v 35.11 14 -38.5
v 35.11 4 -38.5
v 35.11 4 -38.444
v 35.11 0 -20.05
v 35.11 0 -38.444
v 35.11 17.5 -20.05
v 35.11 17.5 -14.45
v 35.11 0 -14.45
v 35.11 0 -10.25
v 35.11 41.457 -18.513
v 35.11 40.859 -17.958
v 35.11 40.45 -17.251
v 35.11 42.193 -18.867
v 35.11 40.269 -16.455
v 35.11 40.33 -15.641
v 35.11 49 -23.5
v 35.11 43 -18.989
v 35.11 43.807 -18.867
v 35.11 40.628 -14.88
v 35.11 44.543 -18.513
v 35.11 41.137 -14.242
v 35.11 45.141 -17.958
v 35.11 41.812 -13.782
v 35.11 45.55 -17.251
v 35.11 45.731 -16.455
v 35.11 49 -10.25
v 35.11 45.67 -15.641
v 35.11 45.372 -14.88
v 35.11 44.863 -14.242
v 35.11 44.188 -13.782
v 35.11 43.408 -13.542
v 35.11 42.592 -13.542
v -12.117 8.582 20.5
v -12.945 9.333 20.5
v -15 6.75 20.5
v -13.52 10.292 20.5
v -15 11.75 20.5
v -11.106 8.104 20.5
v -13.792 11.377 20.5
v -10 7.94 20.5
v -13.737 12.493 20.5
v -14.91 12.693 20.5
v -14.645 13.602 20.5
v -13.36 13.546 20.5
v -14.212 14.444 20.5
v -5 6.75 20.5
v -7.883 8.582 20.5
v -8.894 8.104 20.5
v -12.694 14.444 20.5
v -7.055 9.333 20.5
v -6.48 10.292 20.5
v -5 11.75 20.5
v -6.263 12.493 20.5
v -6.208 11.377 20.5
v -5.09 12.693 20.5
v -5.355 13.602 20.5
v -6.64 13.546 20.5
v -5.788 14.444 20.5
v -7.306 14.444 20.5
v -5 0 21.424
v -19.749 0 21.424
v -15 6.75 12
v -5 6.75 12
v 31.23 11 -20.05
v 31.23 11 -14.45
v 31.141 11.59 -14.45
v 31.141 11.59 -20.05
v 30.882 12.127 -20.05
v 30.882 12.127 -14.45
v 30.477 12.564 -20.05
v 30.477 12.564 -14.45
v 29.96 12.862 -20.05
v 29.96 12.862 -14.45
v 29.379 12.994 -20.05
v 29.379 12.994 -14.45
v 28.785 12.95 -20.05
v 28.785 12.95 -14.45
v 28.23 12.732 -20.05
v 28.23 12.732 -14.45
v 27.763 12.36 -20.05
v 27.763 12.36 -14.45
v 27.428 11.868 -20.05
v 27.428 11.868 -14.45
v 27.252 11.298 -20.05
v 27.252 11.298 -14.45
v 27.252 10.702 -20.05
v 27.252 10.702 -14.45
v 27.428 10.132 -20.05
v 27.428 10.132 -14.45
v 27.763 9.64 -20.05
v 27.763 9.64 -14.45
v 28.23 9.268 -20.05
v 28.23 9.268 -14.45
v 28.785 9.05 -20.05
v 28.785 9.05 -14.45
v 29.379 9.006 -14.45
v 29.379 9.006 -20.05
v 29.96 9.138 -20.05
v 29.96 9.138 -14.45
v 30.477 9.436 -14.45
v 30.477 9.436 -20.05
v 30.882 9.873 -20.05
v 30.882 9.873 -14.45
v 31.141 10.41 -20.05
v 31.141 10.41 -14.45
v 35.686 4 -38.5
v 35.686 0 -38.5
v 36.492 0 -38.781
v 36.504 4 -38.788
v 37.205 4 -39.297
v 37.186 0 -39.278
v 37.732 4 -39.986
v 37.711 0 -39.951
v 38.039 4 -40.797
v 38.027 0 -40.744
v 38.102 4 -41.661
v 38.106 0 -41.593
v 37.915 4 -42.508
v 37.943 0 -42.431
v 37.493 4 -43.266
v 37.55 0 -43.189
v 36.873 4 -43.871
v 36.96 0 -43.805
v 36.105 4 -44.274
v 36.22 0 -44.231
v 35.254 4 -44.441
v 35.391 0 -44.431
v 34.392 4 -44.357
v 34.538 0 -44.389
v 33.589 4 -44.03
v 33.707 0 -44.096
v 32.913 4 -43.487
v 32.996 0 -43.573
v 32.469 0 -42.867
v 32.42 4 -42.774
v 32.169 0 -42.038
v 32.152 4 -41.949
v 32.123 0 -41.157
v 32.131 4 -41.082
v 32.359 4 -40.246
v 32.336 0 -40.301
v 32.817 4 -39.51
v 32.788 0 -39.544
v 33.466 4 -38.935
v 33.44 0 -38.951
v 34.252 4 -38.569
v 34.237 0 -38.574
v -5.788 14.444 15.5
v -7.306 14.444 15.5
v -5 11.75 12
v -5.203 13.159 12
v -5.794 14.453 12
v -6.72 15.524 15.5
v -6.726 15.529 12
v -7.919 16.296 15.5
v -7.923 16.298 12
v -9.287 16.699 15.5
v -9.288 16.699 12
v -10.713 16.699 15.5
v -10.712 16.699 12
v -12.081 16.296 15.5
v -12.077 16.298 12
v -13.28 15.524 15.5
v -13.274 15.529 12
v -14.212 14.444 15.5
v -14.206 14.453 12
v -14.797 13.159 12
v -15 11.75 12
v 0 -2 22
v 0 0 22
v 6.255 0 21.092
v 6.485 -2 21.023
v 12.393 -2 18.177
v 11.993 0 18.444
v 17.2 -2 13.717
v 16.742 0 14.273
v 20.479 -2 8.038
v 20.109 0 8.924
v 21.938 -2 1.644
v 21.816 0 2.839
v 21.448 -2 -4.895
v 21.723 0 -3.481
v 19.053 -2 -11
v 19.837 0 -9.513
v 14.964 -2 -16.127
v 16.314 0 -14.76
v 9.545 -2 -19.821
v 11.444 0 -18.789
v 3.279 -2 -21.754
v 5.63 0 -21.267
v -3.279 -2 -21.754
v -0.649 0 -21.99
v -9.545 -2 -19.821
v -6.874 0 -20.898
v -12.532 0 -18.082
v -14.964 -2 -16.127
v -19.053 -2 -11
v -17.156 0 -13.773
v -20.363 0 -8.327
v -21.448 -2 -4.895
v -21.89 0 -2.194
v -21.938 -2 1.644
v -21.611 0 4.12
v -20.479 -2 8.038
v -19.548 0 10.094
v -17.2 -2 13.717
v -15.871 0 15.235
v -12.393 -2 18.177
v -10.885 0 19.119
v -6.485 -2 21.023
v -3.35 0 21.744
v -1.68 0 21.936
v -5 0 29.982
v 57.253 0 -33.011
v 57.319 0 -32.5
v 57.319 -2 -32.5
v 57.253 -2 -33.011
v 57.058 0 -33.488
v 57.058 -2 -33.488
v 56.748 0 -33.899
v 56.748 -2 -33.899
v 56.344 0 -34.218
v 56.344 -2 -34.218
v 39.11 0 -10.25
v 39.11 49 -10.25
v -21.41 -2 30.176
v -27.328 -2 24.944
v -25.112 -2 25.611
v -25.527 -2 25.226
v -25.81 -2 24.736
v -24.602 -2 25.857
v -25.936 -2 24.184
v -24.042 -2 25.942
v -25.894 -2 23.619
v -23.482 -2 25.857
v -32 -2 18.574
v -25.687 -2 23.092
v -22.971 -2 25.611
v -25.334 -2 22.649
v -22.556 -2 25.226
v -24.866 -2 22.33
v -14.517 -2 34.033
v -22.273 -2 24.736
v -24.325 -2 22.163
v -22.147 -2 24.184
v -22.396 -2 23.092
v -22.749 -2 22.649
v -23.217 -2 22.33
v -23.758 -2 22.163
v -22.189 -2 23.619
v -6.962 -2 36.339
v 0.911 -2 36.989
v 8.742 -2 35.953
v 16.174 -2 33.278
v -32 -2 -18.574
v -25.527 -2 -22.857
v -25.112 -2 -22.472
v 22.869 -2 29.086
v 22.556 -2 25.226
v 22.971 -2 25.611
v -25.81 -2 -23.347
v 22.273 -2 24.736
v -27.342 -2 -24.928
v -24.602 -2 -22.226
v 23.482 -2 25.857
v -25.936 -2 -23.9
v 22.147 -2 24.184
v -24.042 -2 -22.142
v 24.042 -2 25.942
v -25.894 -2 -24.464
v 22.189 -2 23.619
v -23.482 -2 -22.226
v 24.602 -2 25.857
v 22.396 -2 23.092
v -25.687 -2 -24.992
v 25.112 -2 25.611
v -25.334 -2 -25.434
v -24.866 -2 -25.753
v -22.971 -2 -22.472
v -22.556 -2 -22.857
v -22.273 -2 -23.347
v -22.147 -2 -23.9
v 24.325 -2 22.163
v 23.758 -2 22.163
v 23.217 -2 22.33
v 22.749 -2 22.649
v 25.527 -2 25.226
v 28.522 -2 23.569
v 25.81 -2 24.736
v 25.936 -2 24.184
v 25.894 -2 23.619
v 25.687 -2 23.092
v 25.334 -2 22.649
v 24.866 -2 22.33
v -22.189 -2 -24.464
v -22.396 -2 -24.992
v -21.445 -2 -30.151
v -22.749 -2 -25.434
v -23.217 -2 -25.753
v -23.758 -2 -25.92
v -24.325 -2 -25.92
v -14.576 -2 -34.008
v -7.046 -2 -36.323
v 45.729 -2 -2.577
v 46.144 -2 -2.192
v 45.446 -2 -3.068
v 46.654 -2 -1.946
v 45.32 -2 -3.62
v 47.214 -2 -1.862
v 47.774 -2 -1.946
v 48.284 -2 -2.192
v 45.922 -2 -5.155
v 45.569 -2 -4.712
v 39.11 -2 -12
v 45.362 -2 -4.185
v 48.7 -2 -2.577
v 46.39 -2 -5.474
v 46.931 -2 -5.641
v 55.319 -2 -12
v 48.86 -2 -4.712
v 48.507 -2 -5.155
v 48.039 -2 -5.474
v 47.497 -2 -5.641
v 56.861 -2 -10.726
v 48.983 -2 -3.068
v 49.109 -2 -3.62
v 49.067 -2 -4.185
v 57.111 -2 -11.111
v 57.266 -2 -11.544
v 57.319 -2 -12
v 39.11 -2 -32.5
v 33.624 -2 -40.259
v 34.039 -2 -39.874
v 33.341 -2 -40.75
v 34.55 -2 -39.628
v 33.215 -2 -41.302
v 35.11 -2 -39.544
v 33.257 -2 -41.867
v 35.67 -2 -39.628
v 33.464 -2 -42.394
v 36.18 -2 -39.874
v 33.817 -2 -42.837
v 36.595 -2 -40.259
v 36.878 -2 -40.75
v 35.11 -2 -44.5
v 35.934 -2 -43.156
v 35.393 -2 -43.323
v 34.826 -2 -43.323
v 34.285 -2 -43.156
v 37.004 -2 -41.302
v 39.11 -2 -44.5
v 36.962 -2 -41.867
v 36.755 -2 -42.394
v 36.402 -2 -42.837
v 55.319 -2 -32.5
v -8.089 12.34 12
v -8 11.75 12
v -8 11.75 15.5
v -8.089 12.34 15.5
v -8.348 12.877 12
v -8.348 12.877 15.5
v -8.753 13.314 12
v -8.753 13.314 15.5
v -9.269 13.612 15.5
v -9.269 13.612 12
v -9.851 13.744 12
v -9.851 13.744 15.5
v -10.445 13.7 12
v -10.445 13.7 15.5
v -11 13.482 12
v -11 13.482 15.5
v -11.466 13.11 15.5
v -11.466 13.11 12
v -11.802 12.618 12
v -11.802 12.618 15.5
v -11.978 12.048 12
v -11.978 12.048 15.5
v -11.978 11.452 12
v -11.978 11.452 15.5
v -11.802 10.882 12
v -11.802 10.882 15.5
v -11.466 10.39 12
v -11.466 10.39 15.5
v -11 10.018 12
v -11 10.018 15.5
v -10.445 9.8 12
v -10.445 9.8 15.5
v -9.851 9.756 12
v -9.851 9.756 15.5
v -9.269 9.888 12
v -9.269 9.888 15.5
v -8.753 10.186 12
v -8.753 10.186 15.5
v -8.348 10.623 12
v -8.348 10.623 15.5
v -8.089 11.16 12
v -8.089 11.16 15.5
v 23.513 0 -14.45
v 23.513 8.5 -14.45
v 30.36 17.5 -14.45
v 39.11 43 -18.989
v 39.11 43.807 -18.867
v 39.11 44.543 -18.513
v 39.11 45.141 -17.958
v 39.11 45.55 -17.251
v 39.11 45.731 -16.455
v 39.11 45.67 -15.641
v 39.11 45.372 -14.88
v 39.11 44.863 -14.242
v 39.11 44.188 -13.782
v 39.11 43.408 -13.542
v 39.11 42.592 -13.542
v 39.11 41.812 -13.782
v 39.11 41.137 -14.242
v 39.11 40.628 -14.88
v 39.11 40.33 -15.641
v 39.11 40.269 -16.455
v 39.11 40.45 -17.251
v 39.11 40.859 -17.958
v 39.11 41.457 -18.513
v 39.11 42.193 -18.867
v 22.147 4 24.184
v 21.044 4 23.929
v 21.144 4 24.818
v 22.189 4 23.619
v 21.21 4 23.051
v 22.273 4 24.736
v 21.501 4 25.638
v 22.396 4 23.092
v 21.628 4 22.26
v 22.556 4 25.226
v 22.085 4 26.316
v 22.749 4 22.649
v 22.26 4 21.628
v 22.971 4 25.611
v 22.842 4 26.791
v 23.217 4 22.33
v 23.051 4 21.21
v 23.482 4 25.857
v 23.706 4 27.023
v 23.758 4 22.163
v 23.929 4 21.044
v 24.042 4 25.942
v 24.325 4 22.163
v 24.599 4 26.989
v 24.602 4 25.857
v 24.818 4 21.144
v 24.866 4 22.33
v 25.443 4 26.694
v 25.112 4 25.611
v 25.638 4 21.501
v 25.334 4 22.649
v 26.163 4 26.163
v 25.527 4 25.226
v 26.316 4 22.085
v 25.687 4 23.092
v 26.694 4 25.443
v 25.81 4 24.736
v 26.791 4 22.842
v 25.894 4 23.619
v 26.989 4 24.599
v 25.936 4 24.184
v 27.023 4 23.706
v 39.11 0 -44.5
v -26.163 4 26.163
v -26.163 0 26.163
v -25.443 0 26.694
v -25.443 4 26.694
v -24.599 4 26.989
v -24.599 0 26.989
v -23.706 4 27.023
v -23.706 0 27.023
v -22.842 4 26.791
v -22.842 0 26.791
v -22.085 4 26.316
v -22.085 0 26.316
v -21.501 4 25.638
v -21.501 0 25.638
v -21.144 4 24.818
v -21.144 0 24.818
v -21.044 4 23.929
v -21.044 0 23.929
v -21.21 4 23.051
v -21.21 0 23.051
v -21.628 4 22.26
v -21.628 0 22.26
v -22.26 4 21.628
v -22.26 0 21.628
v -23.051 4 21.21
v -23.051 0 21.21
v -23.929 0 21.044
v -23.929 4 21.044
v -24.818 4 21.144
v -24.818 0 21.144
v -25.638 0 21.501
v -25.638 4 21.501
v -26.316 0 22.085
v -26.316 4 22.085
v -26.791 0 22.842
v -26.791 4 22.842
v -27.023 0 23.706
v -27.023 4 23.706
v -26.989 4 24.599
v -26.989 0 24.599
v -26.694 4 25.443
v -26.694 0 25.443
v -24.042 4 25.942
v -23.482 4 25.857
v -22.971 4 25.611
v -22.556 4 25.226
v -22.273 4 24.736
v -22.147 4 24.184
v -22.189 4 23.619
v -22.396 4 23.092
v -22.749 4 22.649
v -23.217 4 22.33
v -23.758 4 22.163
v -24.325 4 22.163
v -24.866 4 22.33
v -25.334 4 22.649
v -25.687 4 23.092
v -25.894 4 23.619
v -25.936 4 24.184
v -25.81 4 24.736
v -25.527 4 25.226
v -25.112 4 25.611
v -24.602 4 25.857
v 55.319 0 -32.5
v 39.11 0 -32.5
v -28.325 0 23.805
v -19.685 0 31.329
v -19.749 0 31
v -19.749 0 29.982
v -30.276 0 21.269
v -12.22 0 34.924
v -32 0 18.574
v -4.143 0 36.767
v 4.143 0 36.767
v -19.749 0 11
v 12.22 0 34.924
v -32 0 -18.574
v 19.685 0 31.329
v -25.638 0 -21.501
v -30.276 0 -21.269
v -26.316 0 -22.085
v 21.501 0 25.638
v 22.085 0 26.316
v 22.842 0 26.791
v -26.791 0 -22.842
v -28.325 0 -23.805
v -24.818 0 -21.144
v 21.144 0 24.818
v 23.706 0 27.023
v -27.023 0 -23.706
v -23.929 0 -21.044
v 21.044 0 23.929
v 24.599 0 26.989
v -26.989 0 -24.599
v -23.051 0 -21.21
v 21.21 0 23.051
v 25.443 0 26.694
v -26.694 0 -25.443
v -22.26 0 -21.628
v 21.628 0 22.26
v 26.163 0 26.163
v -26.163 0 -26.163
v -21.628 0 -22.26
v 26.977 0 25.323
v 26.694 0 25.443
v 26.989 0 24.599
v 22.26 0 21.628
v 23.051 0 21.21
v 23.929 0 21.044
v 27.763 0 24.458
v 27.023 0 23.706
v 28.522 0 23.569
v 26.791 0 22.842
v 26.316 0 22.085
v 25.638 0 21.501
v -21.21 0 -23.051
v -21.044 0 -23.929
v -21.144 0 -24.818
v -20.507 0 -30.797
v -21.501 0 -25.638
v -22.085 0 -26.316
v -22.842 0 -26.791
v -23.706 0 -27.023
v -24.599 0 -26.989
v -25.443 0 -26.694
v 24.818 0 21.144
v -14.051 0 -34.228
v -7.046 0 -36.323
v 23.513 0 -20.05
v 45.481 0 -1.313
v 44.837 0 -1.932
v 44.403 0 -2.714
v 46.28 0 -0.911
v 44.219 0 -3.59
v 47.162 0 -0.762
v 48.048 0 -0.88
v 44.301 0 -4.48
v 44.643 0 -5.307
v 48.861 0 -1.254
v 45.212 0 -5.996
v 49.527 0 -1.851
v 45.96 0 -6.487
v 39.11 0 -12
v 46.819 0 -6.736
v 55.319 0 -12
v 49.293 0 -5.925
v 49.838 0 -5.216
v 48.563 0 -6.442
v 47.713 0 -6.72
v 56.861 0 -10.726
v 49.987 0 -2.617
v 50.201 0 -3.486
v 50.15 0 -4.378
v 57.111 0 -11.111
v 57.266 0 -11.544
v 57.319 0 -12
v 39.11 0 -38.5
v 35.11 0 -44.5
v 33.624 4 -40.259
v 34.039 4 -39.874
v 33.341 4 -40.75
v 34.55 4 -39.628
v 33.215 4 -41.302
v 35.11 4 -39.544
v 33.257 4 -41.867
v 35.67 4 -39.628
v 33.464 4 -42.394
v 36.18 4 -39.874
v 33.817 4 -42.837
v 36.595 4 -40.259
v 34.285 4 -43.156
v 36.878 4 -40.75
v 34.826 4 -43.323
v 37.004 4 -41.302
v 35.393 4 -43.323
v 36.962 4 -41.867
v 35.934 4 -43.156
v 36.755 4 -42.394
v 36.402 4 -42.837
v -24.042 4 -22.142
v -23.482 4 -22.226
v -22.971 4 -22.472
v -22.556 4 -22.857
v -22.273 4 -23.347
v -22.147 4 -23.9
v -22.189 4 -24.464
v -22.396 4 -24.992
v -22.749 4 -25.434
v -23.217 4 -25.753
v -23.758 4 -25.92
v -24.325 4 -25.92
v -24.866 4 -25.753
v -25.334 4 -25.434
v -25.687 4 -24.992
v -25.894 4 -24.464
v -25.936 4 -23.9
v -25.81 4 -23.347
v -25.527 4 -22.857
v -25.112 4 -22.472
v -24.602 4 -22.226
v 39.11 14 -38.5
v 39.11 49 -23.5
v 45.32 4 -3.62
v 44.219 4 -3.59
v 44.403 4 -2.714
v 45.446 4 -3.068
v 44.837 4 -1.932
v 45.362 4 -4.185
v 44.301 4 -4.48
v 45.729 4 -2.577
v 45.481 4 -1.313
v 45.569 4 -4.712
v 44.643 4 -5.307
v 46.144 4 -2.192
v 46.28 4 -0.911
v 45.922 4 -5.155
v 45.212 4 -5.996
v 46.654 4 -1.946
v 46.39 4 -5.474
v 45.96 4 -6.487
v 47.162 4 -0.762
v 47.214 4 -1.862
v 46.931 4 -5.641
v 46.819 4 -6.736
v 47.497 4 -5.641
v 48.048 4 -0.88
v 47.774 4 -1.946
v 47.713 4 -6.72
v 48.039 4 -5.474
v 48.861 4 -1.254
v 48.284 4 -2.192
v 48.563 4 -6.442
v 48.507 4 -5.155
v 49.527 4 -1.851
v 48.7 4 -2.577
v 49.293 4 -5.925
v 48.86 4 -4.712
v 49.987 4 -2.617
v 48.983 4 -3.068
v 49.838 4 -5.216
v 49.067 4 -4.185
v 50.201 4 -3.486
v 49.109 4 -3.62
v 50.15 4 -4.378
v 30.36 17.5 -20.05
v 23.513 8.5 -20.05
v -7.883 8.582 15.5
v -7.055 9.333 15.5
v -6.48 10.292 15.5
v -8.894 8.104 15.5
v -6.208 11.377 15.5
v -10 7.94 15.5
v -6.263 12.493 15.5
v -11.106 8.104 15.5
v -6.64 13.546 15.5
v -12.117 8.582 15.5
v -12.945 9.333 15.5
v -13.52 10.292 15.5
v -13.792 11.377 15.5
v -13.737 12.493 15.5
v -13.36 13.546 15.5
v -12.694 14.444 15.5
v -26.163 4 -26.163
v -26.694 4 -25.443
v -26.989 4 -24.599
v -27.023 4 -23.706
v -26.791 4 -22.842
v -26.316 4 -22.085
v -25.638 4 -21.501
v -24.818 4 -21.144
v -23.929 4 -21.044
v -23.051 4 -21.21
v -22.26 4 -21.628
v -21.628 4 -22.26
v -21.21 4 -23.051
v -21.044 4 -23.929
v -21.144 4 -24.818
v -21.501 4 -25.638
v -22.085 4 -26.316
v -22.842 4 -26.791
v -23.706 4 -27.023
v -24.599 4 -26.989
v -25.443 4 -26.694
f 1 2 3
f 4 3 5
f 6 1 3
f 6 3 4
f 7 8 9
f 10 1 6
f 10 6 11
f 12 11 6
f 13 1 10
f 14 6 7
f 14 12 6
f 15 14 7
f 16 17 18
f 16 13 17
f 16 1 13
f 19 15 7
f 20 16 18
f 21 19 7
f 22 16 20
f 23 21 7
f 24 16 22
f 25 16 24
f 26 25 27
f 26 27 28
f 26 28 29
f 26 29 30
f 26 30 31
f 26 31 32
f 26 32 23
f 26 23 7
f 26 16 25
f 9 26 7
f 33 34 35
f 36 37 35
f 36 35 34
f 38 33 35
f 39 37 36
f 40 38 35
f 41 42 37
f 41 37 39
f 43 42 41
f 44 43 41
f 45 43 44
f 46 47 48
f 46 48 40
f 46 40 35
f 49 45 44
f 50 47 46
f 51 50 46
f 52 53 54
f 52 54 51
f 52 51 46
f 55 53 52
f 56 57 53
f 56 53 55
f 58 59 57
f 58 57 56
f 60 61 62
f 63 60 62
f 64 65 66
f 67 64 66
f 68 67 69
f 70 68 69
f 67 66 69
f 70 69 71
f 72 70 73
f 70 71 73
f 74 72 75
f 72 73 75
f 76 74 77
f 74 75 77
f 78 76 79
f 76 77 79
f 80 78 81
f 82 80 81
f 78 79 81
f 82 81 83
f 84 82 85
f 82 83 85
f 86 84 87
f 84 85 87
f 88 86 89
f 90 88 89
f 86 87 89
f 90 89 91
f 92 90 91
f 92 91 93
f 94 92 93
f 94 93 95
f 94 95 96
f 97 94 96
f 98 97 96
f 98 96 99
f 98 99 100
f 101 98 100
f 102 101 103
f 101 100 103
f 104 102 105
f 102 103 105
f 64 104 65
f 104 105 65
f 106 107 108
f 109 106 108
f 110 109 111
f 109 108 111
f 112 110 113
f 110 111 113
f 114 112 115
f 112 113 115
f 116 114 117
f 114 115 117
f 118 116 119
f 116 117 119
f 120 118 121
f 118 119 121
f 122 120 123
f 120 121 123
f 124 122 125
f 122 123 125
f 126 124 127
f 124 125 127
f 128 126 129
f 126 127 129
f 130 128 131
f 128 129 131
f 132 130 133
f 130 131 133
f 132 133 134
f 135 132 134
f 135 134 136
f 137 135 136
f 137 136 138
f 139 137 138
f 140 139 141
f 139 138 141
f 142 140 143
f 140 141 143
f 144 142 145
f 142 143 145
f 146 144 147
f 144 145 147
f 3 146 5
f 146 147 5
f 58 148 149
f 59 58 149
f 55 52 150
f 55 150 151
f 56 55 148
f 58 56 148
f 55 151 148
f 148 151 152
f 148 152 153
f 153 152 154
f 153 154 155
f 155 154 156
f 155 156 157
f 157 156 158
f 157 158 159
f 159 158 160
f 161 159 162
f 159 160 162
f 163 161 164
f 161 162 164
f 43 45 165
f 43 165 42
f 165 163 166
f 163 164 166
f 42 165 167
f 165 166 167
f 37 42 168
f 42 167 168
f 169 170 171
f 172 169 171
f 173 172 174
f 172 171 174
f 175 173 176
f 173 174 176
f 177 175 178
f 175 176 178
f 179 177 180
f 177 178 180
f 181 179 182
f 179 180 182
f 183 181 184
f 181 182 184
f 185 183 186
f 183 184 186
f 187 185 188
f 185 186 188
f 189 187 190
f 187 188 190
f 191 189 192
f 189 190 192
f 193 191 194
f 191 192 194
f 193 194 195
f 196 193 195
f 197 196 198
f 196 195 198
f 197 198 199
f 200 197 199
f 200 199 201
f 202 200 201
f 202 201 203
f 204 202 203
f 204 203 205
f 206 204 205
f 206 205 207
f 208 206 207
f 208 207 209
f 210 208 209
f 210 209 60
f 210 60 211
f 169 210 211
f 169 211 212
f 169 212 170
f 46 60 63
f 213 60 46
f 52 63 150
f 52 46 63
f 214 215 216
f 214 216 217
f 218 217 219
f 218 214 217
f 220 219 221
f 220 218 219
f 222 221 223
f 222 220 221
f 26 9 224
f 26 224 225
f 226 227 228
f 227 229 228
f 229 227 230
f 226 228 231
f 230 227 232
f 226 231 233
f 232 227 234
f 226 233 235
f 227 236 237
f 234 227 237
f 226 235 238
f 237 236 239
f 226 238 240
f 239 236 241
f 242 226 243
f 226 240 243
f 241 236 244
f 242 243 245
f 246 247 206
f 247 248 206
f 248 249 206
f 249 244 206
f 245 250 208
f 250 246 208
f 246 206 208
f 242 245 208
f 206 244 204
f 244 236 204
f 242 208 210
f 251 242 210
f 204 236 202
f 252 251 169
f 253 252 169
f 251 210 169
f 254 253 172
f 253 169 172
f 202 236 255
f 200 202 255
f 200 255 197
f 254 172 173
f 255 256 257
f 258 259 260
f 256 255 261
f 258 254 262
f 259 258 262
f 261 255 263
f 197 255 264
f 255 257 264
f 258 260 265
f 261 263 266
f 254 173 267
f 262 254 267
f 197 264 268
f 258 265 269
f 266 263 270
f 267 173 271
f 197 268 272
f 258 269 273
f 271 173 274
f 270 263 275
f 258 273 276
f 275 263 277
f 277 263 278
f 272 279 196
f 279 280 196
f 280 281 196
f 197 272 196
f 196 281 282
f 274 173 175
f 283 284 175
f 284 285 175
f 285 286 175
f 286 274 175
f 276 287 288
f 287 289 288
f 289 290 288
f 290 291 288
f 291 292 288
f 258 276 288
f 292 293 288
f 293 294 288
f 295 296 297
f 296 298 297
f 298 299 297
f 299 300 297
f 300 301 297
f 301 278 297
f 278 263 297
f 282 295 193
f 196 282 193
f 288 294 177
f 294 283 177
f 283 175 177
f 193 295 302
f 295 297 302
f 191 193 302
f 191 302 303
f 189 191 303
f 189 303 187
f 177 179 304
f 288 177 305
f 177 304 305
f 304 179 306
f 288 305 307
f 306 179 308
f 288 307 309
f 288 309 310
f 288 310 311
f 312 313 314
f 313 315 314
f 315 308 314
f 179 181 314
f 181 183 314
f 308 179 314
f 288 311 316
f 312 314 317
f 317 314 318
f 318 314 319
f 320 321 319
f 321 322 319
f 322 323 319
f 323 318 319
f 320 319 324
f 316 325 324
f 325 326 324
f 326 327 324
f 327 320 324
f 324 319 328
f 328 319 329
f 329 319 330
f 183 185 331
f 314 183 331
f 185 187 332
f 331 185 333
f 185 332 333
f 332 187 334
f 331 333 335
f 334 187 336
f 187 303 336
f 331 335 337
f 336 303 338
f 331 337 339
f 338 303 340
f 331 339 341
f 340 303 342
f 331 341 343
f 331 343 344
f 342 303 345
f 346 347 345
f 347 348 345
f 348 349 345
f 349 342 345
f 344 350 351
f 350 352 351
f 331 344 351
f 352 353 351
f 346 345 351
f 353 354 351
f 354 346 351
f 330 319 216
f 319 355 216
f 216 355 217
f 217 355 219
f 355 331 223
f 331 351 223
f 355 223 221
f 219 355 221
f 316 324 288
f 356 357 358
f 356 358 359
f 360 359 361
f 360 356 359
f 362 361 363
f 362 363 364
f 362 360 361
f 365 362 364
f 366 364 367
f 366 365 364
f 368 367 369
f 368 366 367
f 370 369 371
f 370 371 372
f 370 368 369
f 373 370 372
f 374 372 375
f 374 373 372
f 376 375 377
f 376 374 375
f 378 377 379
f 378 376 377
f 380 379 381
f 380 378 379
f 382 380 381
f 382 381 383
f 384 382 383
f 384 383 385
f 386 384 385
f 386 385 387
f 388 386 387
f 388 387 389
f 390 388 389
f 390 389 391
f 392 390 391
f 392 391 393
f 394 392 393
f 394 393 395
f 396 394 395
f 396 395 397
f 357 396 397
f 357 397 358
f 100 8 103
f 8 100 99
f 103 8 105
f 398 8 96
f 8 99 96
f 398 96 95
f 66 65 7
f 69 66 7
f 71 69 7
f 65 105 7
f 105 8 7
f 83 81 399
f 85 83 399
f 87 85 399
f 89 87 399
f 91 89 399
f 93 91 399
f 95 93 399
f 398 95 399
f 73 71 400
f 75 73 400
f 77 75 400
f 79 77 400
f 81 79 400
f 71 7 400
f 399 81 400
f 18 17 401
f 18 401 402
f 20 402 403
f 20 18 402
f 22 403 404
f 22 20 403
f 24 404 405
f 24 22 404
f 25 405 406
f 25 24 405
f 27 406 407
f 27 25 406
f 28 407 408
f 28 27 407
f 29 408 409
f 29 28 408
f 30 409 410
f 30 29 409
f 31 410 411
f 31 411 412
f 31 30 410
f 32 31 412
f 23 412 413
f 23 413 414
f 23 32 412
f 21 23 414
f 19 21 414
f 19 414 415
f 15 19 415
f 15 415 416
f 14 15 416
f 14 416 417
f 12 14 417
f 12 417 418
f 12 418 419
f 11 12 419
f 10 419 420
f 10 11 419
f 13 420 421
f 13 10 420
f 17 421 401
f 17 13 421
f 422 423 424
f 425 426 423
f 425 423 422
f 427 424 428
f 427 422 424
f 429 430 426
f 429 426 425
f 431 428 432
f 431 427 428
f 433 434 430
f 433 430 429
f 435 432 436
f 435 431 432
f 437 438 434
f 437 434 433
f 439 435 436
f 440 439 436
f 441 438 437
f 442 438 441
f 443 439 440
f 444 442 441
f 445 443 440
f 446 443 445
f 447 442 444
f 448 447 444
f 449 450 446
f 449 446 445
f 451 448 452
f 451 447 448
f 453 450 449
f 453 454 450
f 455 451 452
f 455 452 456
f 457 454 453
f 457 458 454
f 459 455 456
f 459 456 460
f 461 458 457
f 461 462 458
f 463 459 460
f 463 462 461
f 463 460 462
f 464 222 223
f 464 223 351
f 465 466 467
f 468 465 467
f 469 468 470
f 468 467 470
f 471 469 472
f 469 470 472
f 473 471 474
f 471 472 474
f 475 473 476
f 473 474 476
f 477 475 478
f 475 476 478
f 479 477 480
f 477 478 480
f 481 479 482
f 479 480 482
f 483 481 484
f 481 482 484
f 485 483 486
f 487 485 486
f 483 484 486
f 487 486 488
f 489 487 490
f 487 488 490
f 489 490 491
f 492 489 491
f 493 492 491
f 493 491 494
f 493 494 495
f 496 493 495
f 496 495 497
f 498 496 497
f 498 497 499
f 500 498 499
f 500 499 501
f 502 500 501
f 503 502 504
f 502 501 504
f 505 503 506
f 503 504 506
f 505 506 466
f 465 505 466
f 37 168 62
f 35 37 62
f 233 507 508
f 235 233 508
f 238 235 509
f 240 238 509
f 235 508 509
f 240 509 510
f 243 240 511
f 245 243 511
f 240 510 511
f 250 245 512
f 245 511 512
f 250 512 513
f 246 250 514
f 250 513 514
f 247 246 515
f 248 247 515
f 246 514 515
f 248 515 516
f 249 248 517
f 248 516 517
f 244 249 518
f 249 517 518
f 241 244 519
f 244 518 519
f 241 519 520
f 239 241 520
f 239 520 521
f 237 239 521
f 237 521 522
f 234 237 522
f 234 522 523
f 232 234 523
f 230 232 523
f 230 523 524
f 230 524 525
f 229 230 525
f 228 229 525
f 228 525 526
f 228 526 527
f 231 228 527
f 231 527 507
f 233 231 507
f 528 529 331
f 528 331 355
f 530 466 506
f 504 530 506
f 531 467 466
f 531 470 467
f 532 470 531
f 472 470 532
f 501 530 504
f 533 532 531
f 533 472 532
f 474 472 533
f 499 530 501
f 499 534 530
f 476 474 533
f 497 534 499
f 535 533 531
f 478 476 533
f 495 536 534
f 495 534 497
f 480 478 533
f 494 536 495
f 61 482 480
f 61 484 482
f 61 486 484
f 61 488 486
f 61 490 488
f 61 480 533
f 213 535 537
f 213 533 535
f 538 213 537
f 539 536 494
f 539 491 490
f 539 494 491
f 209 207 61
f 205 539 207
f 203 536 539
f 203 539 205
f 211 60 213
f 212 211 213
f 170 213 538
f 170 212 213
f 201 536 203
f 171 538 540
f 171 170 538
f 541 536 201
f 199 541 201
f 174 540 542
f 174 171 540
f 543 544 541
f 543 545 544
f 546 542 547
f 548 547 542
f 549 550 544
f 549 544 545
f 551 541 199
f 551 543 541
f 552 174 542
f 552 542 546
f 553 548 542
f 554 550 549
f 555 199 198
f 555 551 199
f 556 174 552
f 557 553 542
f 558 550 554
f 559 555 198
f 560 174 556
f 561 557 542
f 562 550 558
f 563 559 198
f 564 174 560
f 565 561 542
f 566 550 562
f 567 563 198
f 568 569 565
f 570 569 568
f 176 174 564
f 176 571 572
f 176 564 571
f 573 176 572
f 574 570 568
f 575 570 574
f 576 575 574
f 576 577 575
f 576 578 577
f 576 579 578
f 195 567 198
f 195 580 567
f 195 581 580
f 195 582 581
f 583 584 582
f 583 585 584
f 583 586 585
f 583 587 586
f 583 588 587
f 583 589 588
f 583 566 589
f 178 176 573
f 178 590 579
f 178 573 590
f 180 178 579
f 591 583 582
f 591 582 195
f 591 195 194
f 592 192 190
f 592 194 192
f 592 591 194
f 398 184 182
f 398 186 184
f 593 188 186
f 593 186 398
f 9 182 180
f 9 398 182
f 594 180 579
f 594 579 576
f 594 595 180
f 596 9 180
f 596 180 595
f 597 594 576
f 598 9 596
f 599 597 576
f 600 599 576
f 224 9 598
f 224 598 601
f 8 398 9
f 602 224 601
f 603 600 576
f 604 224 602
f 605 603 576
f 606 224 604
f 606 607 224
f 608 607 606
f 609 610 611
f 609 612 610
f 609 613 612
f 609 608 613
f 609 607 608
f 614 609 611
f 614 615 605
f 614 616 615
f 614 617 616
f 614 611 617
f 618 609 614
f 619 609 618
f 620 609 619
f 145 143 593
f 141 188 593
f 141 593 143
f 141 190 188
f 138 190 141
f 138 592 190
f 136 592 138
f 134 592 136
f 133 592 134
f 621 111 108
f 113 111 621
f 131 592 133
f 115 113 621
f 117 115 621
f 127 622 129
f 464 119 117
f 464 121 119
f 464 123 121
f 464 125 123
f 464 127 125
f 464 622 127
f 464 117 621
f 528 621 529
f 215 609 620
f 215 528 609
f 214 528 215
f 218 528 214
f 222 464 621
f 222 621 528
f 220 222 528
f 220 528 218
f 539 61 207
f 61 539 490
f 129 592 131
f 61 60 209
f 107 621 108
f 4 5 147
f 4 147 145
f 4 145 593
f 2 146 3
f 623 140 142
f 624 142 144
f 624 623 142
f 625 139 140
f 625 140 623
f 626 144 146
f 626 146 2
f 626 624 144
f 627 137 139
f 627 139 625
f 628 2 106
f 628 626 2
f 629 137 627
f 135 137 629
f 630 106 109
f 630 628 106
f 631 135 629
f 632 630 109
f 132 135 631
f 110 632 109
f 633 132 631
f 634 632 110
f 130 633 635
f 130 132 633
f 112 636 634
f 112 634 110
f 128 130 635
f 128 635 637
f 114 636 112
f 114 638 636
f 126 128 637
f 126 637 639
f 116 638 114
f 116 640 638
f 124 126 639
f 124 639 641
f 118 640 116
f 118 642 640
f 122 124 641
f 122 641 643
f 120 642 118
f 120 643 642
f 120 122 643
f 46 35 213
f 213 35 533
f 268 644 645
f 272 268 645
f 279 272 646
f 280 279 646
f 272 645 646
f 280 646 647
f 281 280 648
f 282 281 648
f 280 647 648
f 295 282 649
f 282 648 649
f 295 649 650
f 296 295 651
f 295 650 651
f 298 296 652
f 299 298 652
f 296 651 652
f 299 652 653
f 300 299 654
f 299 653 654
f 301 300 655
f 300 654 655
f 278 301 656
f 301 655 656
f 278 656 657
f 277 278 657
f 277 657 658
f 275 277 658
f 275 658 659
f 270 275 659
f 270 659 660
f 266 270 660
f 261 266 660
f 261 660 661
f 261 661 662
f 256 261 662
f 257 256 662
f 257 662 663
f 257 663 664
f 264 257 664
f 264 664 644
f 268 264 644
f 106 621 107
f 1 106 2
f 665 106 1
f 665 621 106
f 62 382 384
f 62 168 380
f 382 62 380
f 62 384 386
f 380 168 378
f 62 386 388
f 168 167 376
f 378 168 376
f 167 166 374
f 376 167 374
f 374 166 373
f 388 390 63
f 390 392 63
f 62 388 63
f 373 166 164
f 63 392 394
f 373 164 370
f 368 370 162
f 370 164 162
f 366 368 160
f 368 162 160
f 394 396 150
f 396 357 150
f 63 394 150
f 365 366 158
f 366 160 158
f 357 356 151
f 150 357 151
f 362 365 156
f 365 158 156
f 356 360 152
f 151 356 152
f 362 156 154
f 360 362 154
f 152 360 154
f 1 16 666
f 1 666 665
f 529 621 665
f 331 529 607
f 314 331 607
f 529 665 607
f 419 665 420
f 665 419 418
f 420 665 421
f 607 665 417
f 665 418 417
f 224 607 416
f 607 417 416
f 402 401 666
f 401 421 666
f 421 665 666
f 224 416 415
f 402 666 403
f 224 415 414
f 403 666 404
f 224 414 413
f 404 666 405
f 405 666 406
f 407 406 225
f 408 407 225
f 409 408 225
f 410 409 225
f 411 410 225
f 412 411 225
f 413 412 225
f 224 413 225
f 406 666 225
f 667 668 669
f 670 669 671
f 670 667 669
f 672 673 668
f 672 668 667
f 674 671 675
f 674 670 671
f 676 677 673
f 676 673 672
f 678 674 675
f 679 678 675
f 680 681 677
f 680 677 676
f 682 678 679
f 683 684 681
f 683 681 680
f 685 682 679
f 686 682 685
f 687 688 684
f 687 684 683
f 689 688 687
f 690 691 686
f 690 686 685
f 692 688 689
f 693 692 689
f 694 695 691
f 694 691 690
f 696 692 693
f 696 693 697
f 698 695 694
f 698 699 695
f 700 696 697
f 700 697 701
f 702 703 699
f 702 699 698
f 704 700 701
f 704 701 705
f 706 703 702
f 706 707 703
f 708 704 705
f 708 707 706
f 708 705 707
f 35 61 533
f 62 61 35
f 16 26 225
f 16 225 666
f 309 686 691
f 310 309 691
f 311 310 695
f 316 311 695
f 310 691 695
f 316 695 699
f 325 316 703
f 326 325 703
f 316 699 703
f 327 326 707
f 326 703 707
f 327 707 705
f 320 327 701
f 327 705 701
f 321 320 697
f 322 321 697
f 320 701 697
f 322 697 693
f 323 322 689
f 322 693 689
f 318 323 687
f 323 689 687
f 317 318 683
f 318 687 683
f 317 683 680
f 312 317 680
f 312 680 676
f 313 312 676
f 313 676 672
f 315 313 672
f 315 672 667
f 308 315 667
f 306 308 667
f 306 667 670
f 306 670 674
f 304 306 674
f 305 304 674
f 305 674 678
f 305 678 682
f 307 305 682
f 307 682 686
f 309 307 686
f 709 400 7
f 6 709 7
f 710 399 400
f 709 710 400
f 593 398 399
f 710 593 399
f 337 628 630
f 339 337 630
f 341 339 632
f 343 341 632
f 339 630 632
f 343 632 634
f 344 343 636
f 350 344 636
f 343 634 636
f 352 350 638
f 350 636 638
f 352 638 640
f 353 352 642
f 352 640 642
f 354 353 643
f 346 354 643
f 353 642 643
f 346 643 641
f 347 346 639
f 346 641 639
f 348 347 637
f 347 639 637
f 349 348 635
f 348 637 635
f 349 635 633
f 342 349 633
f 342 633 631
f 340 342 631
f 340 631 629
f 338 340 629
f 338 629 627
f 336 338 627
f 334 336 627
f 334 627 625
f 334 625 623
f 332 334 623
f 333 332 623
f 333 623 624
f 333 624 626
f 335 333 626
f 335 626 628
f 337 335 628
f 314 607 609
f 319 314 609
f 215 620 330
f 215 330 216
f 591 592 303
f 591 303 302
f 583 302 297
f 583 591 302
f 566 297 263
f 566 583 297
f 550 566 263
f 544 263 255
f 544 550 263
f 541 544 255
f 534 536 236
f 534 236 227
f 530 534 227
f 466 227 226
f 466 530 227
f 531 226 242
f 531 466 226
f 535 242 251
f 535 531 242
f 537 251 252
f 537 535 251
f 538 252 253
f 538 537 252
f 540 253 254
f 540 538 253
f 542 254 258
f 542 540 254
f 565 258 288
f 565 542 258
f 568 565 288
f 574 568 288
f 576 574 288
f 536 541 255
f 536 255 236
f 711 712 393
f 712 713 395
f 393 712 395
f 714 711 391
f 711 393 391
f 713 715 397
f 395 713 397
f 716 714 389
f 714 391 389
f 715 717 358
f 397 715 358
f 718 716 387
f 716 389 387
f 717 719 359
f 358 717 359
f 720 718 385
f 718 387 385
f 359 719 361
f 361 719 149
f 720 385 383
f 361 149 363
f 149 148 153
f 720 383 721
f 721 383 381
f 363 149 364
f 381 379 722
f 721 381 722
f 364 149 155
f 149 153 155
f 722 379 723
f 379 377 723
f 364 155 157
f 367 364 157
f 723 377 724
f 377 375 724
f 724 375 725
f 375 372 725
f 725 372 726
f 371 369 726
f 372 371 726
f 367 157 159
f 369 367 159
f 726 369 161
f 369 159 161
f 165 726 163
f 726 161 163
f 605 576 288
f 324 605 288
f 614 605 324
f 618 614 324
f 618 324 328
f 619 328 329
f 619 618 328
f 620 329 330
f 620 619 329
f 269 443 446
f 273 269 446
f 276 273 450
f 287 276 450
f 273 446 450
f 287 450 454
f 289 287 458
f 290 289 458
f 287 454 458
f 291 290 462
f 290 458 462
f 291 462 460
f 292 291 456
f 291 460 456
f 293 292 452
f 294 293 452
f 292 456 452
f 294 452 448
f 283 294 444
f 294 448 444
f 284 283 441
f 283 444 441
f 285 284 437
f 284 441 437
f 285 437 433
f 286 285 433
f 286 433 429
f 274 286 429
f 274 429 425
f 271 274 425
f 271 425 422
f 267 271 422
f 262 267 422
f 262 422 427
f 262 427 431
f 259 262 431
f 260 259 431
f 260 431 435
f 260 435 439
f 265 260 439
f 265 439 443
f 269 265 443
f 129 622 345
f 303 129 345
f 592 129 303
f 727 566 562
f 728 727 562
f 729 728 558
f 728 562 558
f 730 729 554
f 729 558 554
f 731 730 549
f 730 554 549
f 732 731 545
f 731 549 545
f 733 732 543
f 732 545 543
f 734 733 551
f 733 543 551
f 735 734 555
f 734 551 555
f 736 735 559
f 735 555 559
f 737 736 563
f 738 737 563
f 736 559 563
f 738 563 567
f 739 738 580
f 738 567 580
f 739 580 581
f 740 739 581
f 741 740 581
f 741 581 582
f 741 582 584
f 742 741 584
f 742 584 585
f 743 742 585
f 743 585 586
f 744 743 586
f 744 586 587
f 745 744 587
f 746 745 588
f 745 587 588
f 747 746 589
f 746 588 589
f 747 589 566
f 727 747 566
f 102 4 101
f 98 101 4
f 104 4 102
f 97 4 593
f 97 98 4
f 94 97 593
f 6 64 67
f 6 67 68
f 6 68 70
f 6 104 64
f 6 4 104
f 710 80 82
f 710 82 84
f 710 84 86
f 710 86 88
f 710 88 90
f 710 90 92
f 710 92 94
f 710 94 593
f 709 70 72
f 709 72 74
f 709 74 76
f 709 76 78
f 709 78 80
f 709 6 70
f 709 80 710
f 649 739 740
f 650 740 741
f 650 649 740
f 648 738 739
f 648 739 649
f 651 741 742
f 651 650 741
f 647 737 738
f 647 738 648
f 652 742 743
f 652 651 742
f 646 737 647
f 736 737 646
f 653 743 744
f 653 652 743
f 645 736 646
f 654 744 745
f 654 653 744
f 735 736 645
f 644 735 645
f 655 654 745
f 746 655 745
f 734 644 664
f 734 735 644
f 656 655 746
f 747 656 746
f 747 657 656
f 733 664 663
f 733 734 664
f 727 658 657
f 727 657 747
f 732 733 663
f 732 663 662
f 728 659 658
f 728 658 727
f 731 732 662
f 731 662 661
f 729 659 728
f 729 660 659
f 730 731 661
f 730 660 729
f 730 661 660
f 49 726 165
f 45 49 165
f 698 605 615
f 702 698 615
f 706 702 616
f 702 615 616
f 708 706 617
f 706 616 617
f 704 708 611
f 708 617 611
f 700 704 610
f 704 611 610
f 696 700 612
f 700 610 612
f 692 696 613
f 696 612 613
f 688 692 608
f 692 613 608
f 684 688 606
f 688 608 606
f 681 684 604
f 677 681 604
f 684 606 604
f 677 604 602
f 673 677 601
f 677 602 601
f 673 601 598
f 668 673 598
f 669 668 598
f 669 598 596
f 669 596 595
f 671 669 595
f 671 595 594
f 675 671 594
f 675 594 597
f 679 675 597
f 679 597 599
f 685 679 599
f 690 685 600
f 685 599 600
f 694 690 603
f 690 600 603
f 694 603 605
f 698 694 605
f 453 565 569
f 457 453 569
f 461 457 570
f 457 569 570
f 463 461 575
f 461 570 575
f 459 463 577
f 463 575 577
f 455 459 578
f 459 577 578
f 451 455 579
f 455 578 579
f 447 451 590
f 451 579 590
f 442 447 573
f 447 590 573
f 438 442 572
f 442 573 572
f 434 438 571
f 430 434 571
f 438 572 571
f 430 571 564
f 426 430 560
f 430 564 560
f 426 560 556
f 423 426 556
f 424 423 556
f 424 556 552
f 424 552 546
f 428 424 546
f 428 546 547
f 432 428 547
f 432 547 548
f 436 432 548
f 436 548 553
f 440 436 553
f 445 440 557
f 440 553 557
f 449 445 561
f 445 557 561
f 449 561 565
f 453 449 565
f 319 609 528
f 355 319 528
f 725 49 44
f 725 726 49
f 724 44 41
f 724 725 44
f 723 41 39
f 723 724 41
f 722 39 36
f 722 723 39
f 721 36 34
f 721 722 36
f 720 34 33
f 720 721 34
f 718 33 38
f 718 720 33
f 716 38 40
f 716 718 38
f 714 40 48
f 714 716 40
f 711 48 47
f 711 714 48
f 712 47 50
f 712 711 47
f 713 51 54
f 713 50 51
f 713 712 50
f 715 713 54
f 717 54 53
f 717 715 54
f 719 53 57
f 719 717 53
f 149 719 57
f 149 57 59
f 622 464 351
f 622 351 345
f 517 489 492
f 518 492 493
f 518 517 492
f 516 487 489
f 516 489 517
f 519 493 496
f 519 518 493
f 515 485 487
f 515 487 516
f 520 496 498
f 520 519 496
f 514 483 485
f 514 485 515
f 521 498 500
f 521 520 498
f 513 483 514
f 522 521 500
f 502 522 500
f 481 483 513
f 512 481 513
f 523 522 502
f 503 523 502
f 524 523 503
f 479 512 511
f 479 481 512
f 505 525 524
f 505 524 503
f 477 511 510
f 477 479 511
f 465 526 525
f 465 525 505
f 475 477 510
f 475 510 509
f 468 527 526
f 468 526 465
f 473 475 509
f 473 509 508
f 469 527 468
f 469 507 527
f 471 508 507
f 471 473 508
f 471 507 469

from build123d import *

# Parameters (mm, degrees)
SKETCH2_R                = 22
SKETCH2_W                = 16.20928
SKETCH2_H                = 20.5
BOSS_EXTRUDE1_DEPTH      = 2
SKETCH6_R                = 2
BOSS_EXTRUDE3_DEPTH      = 5.6
SKETCH7_R                = 2.739
BOSS_EXTRUDE4_DEPTH      = 4
BOSS_EXTRUDE5_DEPTH      = 5
BOSS_EXTRUDE5_DEPTH_BACK = 3.5
SKETCH9_R                = 2
LOFT4_START              = -19.749341788
LOFT4_DEPTH              = 14.749341788
LOFT4_START_2            = 11
LOFT4_2_DEPTH            = 20
CUT_EXTRUDE1_START       = -5
SKETCH11_R               = 3.81
CUT_EXTRUDE1_DEPTH       = 5
CUT_EXTRUDE2_REACH       = 99.148
SKETCH12_R               = 3
BOSS_EXTRUDE9_DEPTH      = 4
SKETCH14_R               = 1.9
CUT_EXTRUDE3_DEPTH       = 86.385585859
CUT_EXTRUDE5_START       = -5
CUT_EXTRUDE5_DEPTH       = 5


with BuildPart() as part:
    # Sketch2 → Boss-Extrude1 (new body)
    with BuildSketch(Plane(origin=(0, 0, 0), x_dir=(1, 0, 0), z_dir=(0, 1, 0))):
        with BuildLine():
            Line((35.10955, 44.5), (-7.045717951, 36.322965993))
            ThreePointArc((-7.045717951, 36.322965993), (-21.445207215, 30.151336413), (-32, 18.574175621))
            Line((-32, 18.574175621), (-32, -18.574175621))
            ThreePointArc((-32, -18.574175621), (-3.042934445, -36.874659998), (28.522340191, -23.568540685))
            Line((28.522340191, -23.568540685), (56.860578118, 10.726024828))
            ThreePointArc((56.860578118, 10.726024828), (57.200783272, 11.323056958), (57.31883, 12))
            Line((57.31883, 12), (57.31883, 32.5))
            ThreePointArc((57.31883, 32.5), (57.058008676, 33.487551282), (56.343572466, 34.21752813))
            Line((56.343572466, 34.21752813), (39.10955, 44.5))
            Line((39.10955, 44.5), (35.10955, 44.5))
        make_face()
        with Locations(Location((0, 0, 0), (0, 0, 270))):
            Circle(SKETCH2_R, mode=Mode.SUBTRACT)
        with Locations((47.21419, 22.25)):
            Rectangle(SKETCH2_W, SKETCH2_H, mode=Mode.SUBTRACT)
    extrude(amount=-BOSS_EXTRUDE1_DEPTH)

    # Sketch6 → Boss-Extrude3 (add)
    with BuildSketch(Plane.XY.offset(-14.45)):
        Polygon((23.512808221, 0), (23.512808221, 8.5), (30.35955, 17.5), (35.10955, 17.5), (35.10955, 0), align=None)
        with Locations((29.22955, 11)):
            Circle(SKETCH6_R, mode=Mode.SUBTRACT)
    extrude(amount=-BOSS_EXTRUDE3_DEPTH)

    # Sketch7 → Boss-Extrude4 (add)
    with BuildSketch(Plane(origin=(35.10955, 0, 0), x_dir=(0, 0, -1), z_dir=(1, 0, 0))):
        Polygon((44.5, 0), (10.25, 0), (10.25, 49), (23.5, 49), align=None)
        with Locations((16.25, 43)):
            Circle(SKETCH7_R, mode=Mode.SUBTRACT)
    extrude(amount=BOSS_EXTRUDE4_DEPTH)



with BuildPart() as body_2:
    # Sketch9 → Boss-Extrude5 (new, two sides: drawn at the far end of the back side and taken through both)
    with BuildSketch(Plane.XY.offset(15.5).offset(-BOSS_EXTRUDE5_DEPTH_BACK)):
        with BuildLine():
            Line((-15, 11.75), (-15, 6.75))
            Line((-15, 6.75), (-10, 6.75))
            Line((-10, 6.75), (-5, 6.75))
            Line((-5, 6.75), (-5, 11.75))
            ThreePointArc((-5, 11.75), (-10, 16.75), (-15, 11.75))
        make_face()
        with Locations((-10, 11.75)):
            Circle(SKETCH9_R, mode=Mode.SUBTRACT)
    extrude(amount=BOSS_EXTRUDE5_DEPTH + BOSS_EXTRUDE5_DEPTH_BACK)


with BuildPart() as part_1:
    add(part.part)

    add(body_2.part)  # Loft4 merges body 2
    # Loft4: read off the stored shape, not the designer's step
    # Loft4 outline → Loft4 (add)
    with BuildSketch(Plane.YZ.offset(LOFT4_START)):
        Polygon((6.75, 20.5), (0, 29.981530337), (0, 21.424285286), (6.75, 12), align=None)
    extrude(amount=LOFT4_DEPTH)

    # Loft4 2 outline → Loft4 2 (cut)
    with BuildSketch(Plane.XY.offset(LOFT4_START_2)):
        Polygon((-19.749341788, 0), (-15, 6.75), (-19.749341788, 6.75), align=None)
    extrude(amount=LOFT4_2_DEPTH, mode=Mode.SUBTRACT)

    # Sketch11 → Cut-Extrude1 (cut)
    with BuildSketch(Plane.XY.offset(20.5).offset(CUT_EXTRUDE1_START)):
        with Locations((-10, 11.75)):
            Circle(SKETCH11_R)
    extrude(amount=CUT_EXTRUDE1_DEPTH, mode=Mode.SUBTRACT)

    # Sketch13 → Cut-Extrude2 (cut, up to next)
    with BuildSketch(Plane(origin=(39.10955, 0, 0), x_dir=(0, 0, -1), z_dir=(1, 0, 0)), mode=Mode.PRIVATE) as cut_extrude2_sk1:
        Polygon((44.5, 0), (38.5, 0), (38.5, 14), align=None)
    cut_extrude2_tool1 = extrude(cut_extrude2_sk1.sketch, amount=-CUT_EXTRUDE2_REACH, mode=Mode.PRIVATE) & part_1.part
    add(cut_extrude2_tool1.solids().sort_by_distance((39.10955, 4.666667, -40.5))[0], mode=Mode.SUBTRACT)

    # Sketch12 → Boss-Extrude9 (add)
    with BuildSketch(Plane(origin=(0, 0, 0), x_dir=(1, 0, 0), z_dir=(0, 1, 0))):
        with Locations(Location((-24.04163056, 24.04163056, 0), (0, 0, 134.999512051))):
            Circle(SKETCH12_R)
        with Locations(Location((-24.04163056, -24.04163056, 0), (0, 0, 224.999512051))):
            Circle(SKETCH12_R)
        with Locations(Location((24.04163056, -24.04163056, 0), (0, 0, 314.999512068))):
            Circle(SKETCH12_R)
        with Locations(Location((47.21419, 3.761759805, 0), (0, 0, 320.432443614))):
            Circle(SKETCH12_R)
        with Locations((35.10955, 41.444082154)):
            Circle(SKETCH12_R)
    extrude(amount=BOSS_EXTRUDE9_DEPTH)

    # Sketch14 → Cut-Extrude3 (cut, through all)
    with BuildSketch(Plane(origin=(0, 4, 0), x_dir=(1, 0, 0), z_dir=(0, 1, 0))):
        with Locations(Location((-24.04163056, 24.04163056, 0), (0, 0, 270))):
            Circle(SKETCH14_R)
        with Locations(Location((35.10955, 41.444082154, 0), (0, 0, 270))):
            Circle(SKETCH14_R)
        with Locations(Location((47.21419, 3.761759805, 0), (0, 0, 270))):
            Circle(SKETCH14_R)
        with Locations(Location((24.04163056, -24.04163056, 0), (0, 0, 270))):
            Circle(SKETCH14_R)
        with Locations(Location((-24.04163056, -24.04163056, 0), (0, 0, 270))):
            Circle(SKETCH14_R)
    extrude(amount=-CUT_EXTRUDE3_DEPTH, mode=Mode.SUBTRACT)

    # Sketch18 → Cut-Extrude5 (cut)
    with BuildSketch(Plane.XY.offset(20.5).offset(CUT_EXTRUDE5_START)):
        with BuildLine():
            Line((-10, 11.75), (-12.694076836, 14.444076836))
            Line((-12.694076836, 14.444076836), (-14.212119419, 14.444076836))
            ThreePointArc((-14.212119419, 14.444076836), (-10, 16.75), (-5.787880581, 14.444076836))
            Line((-5.787880581, 14.444076836), (-7.305923164, 14.444076836))
            Line((-7.305923164, 14.444076836), (-10, 11.75))
        make_face()
    extrude(amount=CUT_EXTRUDE5_DEPTH, mode=Mode.SUBTRACT)


solid = part_1.part
